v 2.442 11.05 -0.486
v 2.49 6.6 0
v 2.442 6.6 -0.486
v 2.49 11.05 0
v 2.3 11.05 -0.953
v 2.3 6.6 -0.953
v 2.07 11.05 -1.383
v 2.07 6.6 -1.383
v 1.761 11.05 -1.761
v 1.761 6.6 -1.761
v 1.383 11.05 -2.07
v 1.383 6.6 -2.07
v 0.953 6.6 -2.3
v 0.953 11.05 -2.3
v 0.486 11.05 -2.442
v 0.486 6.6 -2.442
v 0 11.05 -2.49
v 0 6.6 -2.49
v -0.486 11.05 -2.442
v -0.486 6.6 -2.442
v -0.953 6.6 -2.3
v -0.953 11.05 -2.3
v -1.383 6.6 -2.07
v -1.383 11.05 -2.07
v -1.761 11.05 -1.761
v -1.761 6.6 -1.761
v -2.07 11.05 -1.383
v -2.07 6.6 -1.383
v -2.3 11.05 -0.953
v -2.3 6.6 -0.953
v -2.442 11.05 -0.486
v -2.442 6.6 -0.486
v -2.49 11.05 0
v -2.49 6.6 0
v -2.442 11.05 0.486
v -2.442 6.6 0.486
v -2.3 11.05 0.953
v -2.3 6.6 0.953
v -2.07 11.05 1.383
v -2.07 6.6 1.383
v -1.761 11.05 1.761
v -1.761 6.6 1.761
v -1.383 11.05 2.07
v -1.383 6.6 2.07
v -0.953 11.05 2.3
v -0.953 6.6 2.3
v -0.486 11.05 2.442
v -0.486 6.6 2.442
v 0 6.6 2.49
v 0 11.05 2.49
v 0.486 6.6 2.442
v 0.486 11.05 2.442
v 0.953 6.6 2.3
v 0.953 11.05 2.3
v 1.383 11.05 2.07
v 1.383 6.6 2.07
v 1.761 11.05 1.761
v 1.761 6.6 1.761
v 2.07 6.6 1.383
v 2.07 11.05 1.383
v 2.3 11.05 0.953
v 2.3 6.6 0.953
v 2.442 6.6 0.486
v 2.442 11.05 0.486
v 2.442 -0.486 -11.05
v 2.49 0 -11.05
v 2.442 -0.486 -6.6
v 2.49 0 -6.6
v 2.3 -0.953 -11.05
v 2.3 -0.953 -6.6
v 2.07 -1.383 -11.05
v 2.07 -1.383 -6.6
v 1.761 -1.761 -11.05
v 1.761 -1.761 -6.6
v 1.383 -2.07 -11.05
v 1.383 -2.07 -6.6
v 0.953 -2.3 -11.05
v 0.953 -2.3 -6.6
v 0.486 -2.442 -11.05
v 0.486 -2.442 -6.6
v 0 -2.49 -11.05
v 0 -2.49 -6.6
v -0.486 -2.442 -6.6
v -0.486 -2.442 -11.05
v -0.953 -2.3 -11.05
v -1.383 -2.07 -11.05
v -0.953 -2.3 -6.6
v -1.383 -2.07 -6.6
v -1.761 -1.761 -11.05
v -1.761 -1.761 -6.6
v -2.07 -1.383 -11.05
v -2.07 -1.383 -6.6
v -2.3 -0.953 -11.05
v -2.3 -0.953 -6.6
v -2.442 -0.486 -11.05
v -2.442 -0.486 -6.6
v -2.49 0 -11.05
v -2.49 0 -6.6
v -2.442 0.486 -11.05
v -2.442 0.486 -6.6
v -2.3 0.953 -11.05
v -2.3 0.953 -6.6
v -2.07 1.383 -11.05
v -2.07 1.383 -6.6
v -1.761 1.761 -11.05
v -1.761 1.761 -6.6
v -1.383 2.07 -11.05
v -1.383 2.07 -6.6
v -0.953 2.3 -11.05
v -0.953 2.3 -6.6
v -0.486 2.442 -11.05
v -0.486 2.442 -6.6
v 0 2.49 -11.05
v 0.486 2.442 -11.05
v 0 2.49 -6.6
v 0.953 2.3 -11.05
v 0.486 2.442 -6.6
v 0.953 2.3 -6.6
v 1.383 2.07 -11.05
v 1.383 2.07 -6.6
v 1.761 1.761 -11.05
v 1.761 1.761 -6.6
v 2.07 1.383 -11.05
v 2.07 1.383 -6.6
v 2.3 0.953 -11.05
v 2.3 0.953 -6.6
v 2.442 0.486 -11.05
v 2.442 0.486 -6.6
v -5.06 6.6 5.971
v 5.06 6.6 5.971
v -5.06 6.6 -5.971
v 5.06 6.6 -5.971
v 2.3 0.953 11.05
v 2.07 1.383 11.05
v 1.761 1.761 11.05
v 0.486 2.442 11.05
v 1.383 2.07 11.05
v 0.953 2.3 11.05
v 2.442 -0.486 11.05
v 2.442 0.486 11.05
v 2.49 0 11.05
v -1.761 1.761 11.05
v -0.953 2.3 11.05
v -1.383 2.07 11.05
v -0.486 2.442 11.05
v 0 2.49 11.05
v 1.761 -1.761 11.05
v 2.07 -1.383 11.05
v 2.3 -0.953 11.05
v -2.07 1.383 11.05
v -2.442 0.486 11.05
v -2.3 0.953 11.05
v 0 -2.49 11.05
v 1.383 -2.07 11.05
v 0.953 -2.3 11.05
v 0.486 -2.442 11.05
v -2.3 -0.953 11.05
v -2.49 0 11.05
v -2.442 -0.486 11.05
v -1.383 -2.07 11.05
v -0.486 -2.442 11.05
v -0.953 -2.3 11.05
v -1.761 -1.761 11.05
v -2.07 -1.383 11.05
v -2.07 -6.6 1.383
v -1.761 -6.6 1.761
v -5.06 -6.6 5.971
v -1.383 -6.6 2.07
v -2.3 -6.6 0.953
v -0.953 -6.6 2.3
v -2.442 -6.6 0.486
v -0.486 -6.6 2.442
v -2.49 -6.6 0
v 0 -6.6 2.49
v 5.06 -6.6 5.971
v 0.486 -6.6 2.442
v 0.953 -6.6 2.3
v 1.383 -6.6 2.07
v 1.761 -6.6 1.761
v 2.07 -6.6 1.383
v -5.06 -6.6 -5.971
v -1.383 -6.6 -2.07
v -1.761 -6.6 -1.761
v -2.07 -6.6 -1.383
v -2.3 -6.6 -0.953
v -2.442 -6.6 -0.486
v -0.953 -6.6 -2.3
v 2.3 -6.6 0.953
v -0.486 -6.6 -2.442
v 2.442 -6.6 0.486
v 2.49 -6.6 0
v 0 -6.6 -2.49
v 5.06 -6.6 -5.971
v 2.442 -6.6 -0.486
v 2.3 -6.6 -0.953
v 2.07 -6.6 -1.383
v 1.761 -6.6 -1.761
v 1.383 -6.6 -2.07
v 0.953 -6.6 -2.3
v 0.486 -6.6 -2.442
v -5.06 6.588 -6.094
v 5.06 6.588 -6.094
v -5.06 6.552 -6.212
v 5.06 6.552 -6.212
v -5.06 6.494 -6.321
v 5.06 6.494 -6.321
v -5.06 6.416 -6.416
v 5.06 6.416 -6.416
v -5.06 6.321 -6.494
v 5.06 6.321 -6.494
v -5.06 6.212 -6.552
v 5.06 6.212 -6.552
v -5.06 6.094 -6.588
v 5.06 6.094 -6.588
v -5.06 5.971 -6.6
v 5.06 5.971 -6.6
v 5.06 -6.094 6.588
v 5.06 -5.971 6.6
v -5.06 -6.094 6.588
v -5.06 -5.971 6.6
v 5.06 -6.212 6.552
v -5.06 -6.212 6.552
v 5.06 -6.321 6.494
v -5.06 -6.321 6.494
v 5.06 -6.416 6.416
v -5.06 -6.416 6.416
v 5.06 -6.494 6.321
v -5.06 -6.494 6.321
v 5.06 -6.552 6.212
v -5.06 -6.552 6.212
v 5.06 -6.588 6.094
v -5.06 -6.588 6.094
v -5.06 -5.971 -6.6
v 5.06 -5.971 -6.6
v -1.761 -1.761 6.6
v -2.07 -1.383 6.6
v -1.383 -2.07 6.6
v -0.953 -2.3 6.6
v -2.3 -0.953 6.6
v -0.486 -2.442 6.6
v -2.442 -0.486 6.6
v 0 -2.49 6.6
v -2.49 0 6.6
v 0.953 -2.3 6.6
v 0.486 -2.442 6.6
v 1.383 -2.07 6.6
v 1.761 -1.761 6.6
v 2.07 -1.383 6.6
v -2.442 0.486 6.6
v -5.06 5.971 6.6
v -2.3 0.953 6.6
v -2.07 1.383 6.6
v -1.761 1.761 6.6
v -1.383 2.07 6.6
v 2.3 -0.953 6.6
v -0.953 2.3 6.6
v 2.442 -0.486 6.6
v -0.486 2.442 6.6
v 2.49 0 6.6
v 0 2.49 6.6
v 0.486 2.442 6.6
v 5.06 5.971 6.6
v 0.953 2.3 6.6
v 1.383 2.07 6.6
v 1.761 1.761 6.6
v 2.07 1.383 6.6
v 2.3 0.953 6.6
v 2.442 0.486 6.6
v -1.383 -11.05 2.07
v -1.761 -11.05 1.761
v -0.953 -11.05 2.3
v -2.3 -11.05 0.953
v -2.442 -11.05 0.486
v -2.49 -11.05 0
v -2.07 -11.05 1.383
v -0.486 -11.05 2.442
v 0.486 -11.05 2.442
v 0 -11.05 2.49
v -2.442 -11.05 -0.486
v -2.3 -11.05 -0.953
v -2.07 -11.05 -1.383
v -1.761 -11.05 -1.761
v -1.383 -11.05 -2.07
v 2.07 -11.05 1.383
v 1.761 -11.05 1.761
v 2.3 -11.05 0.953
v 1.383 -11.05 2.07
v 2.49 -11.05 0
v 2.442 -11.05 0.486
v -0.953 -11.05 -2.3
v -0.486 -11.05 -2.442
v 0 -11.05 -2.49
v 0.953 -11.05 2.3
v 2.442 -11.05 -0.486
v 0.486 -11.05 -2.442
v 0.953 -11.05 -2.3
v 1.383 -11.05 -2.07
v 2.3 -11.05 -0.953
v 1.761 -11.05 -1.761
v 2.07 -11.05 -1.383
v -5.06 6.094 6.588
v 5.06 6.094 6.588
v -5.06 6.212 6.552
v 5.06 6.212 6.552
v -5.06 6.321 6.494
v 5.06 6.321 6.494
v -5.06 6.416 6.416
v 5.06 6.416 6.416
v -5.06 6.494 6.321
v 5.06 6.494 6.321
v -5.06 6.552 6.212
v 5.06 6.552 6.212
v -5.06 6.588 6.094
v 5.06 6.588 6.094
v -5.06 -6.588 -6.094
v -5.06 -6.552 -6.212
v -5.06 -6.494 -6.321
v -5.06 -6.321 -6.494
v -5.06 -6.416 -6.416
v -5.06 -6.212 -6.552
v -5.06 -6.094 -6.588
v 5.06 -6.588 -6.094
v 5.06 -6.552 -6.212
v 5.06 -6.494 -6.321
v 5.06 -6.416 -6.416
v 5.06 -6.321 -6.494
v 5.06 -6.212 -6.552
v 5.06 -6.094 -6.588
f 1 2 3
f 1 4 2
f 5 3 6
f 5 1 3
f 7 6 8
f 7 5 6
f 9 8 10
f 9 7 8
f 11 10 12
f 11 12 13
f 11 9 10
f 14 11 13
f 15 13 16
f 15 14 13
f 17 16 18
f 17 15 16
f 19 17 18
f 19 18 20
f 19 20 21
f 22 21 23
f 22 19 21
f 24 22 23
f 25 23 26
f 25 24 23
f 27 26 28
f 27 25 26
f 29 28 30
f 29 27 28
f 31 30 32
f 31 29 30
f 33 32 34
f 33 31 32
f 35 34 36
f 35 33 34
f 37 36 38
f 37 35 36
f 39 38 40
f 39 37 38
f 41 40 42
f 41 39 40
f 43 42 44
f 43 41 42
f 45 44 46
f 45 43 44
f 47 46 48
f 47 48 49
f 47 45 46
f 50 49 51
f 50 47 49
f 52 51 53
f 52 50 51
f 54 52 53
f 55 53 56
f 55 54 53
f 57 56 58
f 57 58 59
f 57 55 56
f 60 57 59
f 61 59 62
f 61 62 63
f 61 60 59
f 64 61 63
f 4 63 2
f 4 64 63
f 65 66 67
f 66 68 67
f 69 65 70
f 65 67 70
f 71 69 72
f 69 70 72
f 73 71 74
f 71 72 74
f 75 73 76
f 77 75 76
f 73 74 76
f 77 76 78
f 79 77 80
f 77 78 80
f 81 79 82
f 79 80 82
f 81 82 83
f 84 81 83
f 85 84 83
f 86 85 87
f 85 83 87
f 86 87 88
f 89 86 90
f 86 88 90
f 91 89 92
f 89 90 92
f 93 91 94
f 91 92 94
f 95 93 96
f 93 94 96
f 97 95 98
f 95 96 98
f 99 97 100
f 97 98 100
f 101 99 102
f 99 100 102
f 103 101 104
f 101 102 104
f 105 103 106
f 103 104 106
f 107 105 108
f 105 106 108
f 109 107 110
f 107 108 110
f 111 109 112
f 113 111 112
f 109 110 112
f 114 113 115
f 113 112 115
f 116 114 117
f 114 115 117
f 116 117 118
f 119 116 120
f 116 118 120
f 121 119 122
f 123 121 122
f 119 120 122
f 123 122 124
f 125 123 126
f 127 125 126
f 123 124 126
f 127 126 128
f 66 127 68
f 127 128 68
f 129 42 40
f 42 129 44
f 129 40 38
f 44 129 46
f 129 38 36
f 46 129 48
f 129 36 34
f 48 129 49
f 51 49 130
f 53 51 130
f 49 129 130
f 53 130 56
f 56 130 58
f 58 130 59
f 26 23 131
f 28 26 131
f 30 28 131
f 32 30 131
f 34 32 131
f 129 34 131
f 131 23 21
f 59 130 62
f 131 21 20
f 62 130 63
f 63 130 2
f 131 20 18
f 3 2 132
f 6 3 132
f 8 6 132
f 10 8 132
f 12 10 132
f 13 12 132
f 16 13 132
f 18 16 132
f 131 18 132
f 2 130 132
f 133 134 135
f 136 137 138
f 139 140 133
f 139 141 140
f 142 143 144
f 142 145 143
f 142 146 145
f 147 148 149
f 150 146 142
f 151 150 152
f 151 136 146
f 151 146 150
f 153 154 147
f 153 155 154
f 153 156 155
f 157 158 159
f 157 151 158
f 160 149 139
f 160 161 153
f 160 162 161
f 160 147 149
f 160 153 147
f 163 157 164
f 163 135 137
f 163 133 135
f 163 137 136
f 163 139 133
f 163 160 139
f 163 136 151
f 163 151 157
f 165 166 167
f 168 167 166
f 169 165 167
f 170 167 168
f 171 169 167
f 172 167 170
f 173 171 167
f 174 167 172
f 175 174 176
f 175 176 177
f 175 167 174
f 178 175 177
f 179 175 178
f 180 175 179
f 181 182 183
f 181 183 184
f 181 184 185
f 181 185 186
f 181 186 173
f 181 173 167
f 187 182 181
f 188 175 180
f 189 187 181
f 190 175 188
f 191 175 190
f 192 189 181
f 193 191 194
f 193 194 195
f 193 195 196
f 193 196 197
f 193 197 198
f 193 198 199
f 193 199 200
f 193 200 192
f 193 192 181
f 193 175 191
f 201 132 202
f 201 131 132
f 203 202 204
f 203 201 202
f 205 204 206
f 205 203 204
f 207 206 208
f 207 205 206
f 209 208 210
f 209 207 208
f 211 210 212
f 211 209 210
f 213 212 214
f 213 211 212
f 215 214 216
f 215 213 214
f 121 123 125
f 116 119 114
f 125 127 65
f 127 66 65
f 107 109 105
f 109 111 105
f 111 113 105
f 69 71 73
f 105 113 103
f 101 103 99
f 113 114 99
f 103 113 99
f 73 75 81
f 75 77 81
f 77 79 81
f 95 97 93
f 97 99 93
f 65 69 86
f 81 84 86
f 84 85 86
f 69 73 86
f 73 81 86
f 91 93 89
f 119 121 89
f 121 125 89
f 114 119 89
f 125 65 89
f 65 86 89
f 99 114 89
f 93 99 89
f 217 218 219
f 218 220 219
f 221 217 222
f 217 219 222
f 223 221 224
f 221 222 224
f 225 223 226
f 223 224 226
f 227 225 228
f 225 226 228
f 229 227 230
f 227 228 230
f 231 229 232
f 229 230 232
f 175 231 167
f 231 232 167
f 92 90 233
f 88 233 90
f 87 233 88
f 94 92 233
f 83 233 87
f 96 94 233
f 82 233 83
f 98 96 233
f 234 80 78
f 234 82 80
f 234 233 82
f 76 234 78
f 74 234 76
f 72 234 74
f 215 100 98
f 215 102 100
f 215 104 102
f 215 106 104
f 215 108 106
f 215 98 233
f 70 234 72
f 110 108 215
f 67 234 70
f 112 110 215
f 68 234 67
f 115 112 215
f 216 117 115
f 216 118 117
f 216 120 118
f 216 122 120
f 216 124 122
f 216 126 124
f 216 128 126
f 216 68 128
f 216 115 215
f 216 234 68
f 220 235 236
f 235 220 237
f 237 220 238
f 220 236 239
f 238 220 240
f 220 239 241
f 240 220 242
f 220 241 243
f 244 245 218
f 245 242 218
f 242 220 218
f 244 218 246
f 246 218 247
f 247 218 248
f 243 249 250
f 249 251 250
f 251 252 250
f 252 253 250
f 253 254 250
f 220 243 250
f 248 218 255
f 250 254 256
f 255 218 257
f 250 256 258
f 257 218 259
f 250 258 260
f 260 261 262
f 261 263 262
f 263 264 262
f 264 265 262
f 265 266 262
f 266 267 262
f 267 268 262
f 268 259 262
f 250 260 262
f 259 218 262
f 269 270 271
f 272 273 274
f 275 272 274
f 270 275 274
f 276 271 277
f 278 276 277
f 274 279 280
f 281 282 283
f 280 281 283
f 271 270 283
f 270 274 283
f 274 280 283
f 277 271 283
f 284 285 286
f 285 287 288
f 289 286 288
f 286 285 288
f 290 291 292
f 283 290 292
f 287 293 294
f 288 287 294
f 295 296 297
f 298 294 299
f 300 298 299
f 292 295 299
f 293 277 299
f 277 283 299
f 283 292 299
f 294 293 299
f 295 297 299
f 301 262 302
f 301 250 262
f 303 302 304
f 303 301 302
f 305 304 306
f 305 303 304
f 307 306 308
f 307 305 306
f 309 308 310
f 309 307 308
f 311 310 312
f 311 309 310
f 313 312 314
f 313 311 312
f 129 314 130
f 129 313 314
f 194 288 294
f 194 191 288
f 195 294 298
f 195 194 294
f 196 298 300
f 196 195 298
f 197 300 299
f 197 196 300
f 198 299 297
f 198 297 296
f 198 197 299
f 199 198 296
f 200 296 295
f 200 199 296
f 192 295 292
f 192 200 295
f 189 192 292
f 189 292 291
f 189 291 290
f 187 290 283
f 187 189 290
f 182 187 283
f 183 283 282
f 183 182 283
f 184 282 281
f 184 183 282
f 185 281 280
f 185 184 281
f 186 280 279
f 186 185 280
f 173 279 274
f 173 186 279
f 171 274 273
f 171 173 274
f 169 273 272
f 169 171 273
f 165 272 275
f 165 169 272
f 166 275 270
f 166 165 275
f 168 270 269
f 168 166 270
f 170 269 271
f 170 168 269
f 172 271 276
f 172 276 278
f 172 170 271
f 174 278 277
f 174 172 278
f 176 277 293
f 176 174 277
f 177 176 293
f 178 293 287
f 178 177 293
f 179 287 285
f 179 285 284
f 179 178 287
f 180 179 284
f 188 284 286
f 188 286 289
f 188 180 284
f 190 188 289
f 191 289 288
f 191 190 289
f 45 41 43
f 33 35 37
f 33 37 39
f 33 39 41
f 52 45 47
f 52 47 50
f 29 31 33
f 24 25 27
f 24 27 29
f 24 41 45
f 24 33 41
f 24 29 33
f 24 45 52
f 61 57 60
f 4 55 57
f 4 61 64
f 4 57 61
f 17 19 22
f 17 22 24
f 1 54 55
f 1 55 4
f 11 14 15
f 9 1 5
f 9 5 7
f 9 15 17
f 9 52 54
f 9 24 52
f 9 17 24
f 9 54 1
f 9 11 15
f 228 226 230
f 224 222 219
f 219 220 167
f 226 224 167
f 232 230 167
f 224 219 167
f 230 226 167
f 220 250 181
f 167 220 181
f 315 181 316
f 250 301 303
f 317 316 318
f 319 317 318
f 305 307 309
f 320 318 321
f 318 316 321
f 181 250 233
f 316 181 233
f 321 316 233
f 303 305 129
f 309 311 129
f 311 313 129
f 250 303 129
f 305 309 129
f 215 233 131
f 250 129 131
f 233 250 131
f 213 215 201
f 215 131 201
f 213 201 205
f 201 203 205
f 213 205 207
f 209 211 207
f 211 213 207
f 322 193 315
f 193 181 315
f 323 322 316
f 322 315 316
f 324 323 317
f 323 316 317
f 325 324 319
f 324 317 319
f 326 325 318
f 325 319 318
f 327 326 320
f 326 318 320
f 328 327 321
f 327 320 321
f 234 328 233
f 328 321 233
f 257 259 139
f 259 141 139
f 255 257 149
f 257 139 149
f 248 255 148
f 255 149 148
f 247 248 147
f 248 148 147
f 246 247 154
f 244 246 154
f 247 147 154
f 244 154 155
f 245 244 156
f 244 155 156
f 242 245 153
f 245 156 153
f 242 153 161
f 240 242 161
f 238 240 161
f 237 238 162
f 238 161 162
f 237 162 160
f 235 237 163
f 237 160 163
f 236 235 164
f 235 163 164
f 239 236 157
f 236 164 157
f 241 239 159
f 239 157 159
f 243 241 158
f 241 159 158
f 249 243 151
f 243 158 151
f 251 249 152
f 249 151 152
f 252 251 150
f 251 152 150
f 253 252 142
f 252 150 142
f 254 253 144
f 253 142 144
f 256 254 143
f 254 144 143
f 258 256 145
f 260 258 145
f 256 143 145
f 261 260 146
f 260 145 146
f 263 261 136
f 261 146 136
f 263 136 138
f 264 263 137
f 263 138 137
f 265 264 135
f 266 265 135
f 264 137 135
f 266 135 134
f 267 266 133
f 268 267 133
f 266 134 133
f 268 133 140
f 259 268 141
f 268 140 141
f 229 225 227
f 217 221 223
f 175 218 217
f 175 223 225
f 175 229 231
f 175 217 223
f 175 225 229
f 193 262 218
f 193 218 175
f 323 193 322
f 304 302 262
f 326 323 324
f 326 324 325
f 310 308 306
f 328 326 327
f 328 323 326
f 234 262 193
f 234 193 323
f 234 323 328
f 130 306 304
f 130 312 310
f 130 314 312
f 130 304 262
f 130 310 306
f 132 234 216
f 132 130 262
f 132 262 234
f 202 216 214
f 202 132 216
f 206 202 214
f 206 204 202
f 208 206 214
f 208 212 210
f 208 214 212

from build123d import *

# Parameters (mm, degrees)
SZKIC1_W                    = 13.2
SZKIC1_H                    = 13.2
DODANIE_WYCI_GNI_CIE1_DEPTH = 10.12
SZKIC2_W                    = 2.49
SZKIC2_H                    = 4.45
SZKIC3_W                    = 2.49
SZKIC3_H                    = 4.45
SZKIC4_W                    = 2.49
SZKIC4_H                    = 4.45
SZKIC5_W                    = 2.49
SZKIC5_H                    = 4.45
ZAOKR_GLENIE1_R             = 0.628571429


with BuildPart() as part:
    # Szkic1 → Dodanie-wyciągnięcie1 (new body)
    with BuildSketch(Plane(origin=(5.06, 0, 0), x_dir=(0, 0, -1), z_dir=(1, 0, 0))):
        Rectangle(SZKIC1_W, SZKIC1_H)
    extrude(amount=-DODANIE_WYCI_GNI_CIE1_DEPTH)

    # Szkic2 → Obrót1 (revolve)
    with BuildSketch(Plane(origin=(0, 0, 0), x_dir=(-1, 0, 0), z_dir=(0, 0, -1))):
        with Locations((-1.245, 8.825)):
            Rectangle(SZKIC2_W, SZKIC2_H)
    revolve(axis=Axis((0, 6.6, 0), (0, 1, 0)))

    # Szkic3 → Obrót2 (revolve)
    with BuildSketch(Plane.XZ):
        with Locations((1.245, -8.825)):
            Rectangle(SZKIC3_W, SZKIC3_H)
    revolve(axis=Axis((0, 0, -6.6), (0, 0, -1)))

    # Szkic4 → Obrót3 (revolve)
    with BuildSketch(Plane(origin=(0, 0, 0), x_dir=(-1, 0, 0), z_dir=(0, 0, -1))):
        with Locations((-1.245, -8.825)):
            Rectangle(SZKIC4_W, SZKIC4_H)
    revolve(axis=Axis((0, -11.05, 0), (0, 1, 0)))

    # Szkic5 → Obrót4 (revolve)
    with BuildSketch(Plane.XZ):
        with Locations((1.245, 8.825)):
            Rectangle(SZKIC5_W, SZKIC5_H)
    revolve(axis=Axis((0, 0, 11.05), (0, 0, -1)))

    # Zaokrąglenie1
    zaokr_glenie1_edges = [part.edges().sort_by_distance(p)[0] for p in [
        (0, 6.6, -6.6),
        (0, -6.6, -6.6),
        (0, -6.6, 6.6),
        (0, 6.6, 6.6),
    ]]
    fillet(zaokr_glenie1_edges, radius=ZAOKR_GLENIE1_R)


solid = part.part
